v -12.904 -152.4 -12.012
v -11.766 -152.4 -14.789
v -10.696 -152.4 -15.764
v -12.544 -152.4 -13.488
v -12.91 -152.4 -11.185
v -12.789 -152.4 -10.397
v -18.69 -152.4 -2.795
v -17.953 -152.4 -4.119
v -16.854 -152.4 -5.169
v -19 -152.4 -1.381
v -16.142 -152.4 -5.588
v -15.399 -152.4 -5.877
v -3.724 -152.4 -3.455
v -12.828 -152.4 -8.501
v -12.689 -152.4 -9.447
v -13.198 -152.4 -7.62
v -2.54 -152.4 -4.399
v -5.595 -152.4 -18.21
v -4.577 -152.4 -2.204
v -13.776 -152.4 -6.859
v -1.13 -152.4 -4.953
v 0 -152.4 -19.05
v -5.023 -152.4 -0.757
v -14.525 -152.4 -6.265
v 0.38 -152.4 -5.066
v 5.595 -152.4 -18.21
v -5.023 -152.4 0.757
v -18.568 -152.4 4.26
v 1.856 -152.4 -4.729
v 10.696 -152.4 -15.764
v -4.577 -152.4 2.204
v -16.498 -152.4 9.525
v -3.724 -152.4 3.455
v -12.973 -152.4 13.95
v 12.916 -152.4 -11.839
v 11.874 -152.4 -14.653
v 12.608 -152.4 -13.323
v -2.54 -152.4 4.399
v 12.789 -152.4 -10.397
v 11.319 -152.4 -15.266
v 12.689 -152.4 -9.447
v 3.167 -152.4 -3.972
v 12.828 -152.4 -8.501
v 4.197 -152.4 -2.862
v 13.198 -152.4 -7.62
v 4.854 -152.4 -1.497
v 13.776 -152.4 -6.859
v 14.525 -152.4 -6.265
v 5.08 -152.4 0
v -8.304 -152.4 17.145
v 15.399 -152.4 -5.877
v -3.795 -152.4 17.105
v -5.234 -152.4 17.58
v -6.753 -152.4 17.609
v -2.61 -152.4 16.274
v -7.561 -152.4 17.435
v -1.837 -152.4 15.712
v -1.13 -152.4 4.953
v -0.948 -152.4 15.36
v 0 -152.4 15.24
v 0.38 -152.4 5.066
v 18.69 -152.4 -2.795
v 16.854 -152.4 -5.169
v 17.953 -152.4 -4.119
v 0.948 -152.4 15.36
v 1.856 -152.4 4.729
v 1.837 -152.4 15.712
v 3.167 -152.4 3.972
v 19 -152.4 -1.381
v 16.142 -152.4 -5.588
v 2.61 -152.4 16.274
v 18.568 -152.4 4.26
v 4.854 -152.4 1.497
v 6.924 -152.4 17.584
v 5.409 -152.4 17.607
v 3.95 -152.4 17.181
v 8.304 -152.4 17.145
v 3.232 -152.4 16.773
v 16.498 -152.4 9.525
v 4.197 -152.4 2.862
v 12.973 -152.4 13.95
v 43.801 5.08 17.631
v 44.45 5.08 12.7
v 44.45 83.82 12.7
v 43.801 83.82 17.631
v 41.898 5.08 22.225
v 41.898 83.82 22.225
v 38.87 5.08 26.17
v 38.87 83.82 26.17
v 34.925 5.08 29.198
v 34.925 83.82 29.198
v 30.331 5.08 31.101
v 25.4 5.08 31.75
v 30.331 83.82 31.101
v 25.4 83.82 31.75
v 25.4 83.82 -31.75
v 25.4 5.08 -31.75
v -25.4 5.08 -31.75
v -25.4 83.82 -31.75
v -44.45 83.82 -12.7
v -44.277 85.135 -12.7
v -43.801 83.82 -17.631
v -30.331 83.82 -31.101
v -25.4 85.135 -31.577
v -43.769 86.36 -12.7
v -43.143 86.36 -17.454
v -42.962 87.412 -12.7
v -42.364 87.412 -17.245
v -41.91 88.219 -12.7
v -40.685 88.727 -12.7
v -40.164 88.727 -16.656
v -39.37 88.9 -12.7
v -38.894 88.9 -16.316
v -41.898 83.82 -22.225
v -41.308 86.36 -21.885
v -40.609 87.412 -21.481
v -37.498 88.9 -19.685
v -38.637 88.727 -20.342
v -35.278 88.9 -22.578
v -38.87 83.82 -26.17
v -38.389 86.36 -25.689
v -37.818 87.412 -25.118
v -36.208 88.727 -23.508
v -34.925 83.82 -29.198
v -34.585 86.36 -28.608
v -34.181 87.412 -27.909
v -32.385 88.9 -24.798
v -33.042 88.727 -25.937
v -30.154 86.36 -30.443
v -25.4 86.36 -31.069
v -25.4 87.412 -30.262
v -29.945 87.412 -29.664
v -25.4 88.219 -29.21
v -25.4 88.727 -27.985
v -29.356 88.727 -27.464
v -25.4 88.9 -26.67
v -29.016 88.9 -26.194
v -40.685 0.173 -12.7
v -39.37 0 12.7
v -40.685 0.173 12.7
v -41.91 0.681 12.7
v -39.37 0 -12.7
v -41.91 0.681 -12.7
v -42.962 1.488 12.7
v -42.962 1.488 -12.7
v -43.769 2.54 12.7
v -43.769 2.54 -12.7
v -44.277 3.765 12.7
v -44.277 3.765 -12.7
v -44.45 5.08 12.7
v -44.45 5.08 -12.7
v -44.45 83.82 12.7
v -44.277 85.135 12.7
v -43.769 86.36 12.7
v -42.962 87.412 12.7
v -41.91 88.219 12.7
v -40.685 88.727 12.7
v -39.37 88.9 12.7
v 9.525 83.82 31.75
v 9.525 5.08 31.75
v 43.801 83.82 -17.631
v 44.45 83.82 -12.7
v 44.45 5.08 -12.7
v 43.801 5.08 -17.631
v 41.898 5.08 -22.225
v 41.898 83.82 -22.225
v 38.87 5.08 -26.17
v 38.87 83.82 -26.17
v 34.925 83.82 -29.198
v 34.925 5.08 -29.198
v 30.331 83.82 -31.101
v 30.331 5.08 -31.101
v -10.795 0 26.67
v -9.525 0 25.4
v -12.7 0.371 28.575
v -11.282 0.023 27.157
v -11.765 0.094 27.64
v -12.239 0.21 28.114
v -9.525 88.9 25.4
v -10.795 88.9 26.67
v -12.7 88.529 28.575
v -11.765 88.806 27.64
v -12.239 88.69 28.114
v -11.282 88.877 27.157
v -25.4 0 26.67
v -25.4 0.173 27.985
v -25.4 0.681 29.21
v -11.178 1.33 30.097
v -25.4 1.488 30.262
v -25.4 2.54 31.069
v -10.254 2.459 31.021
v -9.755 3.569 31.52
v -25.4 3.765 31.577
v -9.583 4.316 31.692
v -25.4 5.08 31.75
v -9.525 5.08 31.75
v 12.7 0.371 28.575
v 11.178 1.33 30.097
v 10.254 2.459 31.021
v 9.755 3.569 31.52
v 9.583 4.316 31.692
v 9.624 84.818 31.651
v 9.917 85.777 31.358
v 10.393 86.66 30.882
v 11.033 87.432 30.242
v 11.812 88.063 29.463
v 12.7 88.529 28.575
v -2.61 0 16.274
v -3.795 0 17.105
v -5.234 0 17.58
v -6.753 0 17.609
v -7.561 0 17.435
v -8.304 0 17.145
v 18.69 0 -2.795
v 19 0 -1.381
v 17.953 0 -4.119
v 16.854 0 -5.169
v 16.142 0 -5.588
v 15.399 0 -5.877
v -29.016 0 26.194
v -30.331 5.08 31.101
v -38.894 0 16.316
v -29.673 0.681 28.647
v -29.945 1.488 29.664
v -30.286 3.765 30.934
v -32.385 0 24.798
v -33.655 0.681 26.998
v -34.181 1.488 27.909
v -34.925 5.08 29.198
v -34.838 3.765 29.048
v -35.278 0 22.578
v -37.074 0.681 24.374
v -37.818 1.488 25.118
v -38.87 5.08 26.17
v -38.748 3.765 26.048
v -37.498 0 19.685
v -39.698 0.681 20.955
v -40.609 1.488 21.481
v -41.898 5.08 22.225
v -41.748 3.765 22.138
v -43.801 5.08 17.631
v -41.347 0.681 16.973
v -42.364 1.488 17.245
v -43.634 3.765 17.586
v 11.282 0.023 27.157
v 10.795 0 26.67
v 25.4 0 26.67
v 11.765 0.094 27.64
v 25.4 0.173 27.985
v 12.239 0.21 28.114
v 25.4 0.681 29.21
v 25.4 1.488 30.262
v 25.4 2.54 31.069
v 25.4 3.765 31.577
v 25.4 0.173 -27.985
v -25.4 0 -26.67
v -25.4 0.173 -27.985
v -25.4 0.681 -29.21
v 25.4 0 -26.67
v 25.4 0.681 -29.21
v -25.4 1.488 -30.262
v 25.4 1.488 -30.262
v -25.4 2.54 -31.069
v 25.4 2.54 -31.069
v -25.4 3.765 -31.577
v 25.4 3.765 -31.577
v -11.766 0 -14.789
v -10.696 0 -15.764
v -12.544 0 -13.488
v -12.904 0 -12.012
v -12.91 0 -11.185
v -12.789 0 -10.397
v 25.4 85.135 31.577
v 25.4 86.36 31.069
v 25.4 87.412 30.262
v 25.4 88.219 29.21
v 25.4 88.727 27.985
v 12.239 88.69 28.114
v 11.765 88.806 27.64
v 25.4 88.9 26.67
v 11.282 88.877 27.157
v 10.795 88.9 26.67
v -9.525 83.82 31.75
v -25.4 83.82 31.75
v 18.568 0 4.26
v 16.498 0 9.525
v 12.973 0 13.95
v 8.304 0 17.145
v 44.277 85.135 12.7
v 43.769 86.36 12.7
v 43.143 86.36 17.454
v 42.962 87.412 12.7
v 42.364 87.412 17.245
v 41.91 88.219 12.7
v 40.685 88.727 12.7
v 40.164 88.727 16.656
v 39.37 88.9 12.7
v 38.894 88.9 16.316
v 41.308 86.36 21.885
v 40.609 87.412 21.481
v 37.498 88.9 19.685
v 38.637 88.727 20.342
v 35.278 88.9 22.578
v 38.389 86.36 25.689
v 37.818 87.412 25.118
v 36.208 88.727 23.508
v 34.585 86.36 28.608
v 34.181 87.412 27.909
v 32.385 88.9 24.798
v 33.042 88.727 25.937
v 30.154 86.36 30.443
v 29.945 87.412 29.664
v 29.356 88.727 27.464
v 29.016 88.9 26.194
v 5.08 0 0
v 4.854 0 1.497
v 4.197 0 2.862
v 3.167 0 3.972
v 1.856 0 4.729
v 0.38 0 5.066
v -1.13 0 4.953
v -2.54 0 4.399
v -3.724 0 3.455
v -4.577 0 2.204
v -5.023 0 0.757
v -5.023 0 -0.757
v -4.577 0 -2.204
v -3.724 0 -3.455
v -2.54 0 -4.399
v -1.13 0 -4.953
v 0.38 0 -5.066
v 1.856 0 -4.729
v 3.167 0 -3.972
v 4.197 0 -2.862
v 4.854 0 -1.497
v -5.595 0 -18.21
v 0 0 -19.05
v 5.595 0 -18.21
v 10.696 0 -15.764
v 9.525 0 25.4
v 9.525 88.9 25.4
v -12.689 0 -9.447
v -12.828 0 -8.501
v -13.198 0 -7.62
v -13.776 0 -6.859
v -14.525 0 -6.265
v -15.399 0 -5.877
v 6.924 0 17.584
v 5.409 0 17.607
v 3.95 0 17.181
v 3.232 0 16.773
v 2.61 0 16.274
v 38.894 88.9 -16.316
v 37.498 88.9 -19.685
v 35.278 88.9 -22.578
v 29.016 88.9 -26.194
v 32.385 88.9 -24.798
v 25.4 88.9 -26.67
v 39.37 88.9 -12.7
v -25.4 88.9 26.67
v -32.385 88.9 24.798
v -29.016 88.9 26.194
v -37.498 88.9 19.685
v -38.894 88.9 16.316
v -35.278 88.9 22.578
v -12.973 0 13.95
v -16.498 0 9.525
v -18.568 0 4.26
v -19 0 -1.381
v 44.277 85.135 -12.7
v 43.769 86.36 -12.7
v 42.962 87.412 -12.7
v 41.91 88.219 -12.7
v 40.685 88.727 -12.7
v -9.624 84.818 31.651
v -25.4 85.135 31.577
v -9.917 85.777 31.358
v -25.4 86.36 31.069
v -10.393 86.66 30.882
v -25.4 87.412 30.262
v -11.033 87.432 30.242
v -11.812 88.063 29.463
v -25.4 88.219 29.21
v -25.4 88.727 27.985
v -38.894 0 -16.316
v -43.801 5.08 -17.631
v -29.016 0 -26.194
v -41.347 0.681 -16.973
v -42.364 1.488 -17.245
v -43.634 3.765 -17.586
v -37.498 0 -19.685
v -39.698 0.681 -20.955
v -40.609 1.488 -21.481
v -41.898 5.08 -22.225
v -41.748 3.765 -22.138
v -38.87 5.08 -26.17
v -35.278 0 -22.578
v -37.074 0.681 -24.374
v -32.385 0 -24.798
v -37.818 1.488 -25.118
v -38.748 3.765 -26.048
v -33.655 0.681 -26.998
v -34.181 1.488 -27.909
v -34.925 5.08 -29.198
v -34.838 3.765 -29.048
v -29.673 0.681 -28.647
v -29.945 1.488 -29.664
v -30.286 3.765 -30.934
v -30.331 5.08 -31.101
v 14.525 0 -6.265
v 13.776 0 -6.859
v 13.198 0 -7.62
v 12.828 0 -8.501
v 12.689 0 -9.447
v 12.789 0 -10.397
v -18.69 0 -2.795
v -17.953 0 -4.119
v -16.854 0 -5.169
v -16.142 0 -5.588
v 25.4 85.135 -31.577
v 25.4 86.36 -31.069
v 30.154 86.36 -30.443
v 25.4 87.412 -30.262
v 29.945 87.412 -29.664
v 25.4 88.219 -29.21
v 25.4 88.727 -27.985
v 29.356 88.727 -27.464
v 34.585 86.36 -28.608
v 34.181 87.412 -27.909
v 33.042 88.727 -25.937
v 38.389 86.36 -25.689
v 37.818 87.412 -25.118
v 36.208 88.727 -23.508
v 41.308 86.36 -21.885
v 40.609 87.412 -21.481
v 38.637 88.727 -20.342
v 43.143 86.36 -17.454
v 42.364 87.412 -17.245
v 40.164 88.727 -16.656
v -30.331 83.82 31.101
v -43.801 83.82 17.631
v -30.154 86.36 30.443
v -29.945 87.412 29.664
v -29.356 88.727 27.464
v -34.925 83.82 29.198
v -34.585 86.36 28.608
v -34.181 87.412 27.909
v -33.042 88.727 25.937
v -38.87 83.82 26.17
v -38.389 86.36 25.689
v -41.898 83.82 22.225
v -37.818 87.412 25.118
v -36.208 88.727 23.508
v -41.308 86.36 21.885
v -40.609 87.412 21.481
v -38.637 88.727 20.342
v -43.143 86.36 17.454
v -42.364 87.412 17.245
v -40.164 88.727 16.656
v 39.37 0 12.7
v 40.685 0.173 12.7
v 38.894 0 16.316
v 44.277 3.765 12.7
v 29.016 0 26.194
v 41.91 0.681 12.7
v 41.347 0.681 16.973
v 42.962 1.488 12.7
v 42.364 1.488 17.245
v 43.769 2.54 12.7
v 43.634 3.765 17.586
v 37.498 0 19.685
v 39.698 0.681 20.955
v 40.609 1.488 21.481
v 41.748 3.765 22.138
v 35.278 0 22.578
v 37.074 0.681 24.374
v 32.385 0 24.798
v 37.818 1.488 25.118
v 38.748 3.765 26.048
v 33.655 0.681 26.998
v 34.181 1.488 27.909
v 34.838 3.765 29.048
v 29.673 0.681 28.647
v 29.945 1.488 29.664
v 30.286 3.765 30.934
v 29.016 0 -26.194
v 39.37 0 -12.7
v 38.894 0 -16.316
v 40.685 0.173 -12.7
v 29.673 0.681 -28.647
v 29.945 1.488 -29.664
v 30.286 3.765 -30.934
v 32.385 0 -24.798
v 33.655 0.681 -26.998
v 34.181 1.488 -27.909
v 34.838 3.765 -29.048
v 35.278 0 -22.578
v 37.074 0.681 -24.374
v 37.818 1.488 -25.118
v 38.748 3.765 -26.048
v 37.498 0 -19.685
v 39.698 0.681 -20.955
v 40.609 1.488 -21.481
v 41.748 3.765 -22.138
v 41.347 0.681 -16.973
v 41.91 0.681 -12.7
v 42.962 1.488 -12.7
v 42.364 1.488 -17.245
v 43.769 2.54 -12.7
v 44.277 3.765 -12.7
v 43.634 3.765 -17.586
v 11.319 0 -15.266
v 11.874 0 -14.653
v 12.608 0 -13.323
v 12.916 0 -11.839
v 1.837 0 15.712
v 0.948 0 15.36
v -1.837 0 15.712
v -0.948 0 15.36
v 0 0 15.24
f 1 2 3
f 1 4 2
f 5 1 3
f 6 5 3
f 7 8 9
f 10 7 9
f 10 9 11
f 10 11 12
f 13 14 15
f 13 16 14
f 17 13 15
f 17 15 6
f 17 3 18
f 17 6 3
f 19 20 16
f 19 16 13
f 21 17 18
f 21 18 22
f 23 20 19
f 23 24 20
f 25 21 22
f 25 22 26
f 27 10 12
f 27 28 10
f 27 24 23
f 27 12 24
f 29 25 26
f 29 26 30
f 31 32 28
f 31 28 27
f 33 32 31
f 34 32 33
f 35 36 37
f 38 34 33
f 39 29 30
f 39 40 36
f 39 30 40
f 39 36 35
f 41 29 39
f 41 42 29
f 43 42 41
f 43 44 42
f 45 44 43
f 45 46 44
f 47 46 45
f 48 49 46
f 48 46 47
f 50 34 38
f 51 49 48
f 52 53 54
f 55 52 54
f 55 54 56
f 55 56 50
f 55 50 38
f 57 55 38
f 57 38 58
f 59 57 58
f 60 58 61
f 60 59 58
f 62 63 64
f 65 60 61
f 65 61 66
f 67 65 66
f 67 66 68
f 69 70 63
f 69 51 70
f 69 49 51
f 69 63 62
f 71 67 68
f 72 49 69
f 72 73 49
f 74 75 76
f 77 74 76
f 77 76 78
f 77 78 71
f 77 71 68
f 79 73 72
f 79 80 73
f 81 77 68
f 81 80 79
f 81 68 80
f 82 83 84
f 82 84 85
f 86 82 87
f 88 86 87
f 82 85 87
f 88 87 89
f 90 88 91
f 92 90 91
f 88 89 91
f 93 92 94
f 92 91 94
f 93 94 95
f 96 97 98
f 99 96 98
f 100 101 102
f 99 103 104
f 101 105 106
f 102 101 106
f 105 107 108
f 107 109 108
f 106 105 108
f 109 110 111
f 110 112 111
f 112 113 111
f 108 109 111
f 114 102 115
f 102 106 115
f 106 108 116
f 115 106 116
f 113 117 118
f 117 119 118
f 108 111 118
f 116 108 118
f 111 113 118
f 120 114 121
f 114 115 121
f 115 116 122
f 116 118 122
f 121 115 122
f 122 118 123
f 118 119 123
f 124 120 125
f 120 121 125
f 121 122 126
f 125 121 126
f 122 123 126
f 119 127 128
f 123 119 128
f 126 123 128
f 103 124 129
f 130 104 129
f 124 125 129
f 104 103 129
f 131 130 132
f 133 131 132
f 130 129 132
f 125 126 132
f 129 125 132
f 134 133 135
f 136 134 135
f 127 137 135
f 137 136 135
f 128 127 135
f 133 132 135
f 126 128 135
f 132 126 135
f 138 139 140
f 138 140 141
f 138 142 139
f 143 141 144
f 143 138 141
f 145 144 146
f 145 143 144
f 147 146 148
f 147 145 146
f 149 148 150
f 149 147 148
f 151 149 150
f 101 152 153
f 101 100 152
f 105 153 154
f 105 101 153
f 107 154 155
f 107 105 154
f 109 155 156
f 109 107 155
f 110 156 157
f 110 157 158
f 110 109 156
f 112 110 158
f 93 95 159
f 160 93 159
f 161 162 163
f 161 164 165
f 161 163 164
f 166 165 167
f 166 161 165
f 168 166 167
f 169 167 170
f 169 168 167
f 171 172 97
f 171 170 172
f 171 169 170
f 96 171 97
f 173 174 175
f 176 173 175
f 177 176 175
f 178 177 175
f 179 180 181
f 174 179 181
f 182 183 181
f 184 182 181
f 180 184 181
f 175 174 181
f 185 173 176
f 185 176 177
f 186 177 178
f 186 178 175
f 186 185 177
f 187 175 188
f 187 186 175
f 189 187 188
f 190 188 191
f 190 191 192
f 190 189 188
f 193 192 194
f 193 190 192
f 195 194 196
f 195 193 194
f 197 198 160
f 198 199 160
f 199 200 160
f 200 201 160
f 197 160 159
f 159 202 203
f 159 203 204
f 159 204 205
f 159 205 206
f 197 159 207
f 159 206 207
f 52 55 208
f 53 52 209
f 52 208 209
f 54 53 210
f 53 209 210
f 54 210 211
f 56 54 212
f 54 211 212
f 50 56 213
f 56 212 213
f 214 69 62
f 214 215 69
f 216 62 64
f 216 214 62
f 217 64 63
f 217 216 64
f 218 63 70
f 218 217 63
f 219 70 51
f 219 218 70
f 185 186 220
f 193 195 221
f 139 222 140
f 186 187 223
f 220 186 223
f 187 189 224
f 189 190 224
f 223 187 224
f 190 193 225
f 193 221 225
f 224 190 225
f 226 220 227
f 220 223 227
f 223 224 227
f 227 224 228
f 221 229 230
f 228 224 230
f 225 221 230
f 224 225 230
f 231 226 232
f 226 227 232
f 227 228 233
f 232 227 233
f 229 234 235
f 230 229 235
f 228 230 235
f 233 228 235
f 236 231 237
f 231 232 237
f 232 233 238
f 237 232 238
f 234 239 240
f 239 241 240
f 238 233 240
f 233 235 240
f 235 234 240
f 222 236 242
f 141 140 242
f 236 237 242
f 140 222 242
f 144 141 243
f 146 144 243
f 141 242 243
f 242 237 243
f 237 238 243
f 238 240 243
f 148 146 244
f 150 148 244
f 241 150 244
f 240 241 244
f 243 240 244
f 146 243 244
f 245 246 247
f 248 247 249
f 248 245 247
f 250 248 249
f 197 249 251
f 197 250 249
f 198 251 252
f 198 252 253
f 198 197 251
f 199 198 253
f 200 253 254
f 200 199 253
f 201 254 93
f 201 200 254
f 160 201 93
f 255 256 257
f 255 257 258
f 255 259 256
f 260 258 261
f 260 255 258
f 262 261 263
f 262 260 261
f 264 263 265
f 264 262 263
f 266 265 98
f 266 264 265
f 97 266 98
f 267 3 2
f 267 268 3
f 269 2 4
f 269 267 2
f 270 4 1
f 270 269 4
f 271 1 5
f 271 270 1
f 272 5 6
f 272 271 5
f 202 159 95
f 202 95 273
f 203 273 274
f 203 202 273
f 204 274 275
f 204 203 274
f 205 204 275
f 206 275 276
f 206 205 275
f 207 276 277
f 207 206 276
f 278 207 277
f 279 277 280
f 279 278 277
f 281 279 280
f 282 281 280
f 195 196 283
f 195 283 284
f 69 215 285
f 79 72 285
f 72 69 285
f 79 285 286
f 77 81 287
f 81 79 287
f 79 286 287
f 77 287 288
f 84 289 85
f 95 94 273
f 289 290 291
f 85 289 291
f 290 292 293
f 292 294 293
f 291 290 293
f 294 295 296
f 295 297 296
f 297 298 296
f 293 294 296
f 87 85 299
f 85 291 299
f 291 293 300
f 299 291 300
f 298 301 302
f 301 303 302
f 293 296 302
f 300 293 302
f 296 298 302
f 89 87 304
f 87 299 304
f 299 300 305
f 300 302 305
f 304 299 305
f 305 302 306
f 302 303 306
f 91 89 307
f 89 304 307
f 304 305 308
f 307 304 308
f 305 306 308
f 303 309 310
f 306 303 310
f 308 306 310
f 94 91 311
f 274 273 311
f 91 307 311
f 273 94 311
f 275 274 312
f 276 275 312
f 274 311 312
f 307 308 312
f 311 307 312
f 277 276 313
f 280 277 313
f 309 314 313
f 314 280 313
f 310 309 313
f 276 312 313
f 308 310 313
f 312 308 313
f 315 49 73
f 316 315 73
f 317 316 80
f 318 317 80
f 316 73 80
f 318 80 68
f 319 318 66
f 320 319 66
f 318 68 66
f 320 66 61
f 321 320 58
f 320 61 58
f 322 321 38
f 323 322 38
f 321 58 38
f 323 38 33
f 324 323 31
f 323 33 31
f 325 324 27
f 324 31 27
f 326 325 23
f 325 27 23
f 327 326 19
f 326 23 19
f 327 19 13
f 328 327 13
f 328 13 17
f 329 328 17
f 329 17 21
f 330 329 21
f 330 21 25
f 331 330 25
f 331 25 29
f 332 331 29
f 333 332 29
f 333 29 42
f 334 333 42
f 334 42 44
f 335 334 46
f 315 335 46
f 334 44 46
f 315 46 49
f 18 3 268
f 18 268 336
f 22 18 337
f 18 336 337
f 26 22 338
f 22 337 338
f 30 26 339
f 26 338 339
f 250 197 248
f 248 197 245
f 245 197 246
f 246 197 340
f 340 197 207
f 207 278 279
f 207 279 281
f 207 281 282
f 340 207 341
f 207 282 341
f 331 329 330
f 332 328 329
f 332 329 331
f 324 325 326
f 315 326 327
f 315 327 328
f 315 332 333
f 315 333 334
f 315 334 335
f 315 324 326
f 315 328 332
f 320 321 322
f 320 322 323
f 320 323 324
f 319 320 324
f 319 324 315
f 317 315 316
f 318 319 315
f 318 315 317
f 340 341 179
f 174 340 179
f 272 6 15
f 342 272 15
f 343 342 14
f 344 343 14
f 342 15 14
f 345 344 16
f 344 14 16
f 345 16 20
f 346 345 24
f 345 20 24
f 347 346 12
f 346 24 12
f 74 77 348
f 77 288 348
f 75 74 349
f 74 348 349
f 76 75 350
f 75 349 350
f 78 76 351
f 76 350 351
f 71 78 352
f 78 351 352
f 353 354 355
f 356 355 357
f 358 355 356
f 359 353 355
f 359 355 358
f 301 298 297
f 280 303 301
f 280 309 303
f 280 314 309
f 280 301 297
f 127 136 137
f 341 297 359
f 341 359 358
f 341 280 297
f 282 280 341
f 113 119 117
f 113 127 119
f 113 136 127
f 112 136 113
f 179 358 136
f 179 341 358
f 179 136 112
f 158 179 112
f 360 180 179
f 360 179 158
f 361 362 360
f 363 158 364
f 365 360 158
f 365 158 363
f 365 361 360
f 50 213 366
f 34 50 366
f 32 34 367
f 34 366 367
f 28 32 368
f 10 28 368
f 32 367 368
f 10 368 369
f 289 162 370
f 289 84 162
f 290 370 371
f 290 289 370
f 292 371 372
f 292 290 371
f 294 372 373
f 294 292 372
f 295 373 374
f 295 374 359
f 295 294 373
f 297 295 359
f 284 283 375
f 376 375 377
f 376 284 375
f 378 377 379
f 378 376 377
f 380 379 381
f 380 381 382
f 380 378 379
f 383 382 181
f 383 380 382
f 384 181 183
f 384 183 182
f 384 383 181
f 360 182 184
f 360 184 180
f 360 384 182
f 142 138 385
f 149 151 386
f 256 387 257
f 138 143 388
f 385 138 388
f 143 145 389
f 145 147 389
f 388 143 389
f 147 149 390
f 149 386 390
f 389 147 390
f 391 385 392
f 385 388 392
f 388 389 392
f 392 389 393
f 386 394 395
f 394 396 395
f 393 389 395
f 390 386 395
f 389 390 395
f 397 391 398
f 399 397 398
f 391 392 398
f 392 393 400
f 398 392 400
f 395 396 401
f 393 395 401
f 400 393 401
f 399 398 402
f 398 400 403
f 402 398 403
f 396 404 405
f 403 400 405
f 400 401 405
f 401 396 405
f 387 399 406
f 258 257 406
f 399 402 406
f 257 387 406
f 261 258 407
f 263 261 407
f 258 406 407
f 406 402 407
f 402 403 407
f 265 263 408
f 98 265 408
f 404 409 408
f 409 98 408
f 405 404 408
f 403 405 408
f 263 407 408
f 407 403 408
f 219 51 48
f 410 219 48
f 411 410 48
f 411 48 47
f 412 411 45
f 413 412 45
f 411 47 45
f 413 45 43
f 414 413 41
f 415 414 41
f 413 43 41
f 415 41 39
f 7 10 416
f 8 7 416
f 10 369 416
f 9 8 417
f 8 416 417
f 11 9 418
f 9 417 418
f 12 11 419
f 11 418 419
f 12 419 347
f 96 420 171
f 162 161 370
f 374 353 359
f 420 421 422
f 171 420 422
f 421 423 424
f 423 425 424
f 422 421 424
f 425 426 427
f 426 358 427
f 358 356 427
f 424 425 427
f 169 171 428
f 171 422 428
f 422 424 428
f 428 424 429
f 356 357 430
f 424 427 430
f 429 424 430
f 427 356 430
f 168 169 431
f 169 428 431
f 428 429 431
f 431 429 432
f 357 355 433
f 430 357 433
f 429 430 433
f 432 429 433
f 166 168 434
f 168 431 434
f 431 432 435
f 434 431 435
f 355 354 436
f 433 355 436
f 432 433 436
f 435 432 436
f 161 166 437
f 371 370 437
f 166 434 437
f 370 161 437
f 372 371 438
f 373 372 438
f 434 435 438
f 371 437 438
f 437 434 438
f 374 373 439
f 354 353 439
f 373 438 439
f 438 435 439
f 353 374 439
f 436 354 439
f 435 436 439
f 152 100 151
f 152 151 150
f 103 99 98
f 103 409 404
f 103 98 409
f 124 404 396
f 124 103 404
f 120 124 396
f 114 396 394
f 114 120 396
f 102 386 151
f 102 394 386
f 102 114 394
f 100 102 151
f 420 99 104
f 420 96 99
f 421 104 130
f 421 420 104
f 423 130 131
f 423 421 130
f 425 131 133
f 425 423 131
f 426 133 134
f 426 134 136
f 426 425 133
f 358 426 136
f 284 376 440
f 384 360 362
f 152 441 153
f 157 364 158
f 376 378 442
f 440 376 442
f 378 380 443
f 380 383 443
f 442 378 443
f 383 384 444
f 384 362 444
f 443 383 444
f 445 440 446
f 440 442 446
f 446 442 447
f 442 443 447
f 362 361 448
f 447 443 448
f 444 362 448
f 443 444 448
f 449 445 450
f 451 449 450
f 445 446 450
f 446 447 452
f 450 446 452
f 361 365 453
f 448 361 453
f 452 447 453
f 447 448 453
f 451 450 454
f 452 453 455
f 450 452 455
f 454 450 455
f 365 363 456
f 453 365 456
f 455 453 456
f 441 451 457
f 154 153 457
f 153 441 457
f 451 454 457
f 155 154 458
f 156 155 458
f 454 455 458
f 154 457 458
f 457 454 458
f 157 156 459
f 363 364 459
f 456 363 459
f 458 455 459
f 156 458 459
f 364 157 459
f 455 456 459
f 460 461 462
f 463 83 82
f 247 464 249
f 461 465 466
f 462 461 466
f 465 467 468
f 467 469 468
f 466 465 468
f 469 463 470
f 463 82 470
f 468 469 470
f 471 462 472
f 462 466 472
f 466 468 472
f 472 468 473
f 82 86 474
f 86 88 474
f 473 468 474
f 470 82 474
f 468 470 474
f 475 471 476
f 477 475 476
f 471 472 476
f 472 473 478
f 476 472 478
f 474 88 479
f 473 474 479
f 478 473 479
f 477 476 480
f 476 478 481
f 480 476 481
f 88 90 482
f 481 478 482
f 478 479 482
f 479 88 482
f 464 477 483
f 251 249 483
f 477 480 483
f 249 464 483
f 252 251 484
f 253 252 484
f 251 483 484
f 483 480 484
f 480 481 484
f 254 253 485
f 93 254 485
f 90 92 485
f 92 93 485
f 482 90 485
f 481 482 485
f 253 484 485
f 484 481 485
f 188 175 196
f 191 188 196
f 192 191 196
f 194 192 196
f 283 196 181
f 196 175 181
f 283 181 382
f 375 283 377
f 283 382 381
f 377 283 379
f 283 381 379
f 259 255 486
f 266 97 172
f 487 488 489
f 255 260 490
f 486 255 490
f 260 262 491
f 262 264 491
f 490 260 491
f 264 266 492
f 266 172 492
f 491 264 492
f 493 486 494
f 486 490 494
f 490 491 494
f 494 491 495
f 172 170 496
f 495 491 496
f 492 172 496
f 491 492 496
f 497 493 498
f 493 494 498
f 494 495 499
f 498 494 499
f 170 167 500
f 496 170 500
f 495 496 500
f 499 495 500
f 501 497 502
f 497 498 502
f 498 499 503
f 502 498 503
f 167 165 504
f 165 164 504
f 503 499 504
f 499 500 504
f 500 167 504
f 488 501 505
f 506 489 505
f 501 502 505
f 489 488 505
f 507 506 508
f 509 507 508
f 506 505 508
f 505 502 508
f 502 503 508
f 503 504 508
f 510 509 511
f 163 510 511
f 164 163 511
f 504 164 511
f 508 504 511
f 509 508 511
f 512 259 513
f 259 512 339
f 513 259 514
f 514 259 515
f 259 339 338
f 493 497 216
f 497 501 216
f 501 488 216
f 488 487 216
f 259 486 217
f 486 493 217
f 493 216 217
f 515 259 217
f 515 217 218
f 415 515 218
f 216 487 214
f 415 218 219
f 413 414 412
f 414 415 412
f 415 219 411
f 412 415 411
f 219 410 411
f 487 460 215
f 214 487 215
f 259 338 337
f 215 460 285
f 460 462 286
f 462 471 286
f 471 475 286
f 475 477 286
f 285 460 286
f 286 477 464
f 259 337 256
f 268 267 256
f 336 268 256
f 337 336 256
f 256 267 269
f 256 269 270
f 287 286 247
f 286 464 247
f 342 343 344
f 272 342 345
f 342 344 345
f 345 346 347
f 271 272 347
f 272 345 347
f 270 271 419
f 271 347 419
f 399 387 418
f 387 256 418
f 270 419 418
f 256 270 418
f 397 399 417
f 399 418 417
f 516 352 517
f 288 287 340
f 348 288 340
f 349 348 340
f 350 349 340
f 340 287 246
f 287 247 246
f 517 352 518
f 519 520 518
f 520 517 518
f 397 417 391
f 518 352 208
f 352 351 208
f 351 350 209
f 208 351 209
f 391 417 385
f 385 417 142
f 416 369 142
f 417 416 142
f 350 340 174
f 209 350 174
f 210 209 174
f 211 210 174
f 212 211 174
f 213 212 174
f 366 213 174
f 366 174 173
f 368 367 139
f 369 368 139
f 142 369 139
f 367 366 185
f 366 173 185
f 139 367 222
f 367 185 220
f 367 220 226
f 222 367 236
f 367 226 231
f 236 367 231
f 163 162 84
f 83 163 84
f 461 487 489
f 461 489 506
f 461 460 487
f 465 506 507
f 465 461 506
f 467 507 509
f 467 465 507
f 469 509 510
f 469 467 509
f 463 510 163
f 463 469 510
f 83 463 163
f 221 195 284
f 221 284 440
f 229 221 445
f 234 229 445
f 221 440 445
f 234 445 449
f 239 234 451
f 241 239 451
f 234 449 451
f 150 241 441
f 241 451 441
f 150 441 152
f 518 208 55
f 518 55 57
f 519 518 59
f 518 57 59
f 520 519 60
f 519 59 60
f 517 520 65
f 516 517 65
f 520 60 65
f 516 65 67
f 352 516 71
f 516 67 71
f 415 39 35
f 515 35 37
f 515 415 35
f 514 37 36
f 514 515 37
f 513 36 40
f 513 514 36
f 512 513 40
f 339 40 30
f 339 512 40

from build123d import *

# Parameters (mm, degrees)
F0_R     = 19.05
F1_DEPTH = 152.4
F2_W     = 88.9
F2_H     = 63.5
F3_DEPTH = 88.9
F4_R     = 19.05
F5_R     = 5.08
F6_DEPTH = 152.4
F8_DEPTH = 241.301
F9_R     = 5.08
F10_R    = 5.08


with BuildPart() as f1:
    # F0 (on Front) → F1 (new body)
    with BuildSketch(Plane.XZ):
        Circle(F0_R)
    extrude(amount=F1_DEPTH)

    # F2 (on face) → F3 (join)
    with BuildSketch(Plane(origin=(0, 0, 0), x_dir=(-1, 0, 0), z_dir=(0, 1, 0))):
        Rectangle(F2_W, F2_H)
    extrude(amount=F3_DEPTH)

    # F4
    f4_edges = [f1.edges().sort_by_distance(p)[0] for p in [
        (44.45, 44.45, 31.75),
        (-44.45, 44.45, 31.75),
        (-44.45, 44.45, -31.75),
        (44.45, 44.45, -31.75),
    ]]
    fillet(f4_edges, radius=F4_R)

    # F5 (on face) → F6 (cut, through all)
    with BuildSketch(Plane.XZ.offset(152.4)):
        Circle(F5_R)
        with BuildLine():
            ThreePointArc((3.7909021354, 18.669), (0, 19.05), (-3.7909021354, 18.669))
            ThreePointArc((-3.7909021354, 18.669), (0, 15.24), (3.7909021354, 18.669))
        make_face()
        with BuildLine():
            ThreePointArc((-18.0632793309, -6.0514824475), (-16.4977839421, -9.525), (-14.2723771956, -12.6175175525))
            ThreePointArc((-14.2723771956, -12.6175175525), (-13.1982271537, -7.62), (-18.0632793309, -6.0514824475))
        make_face()
        with BuildLine():
            ThreePointArc((14.2723771956, -12.6175175525), (16.4977839421, -9.525), (18.0632793309, -6.0514824475))
            ThreePointArc((18.0632793309, -6.0514824475), (13.1982271537, -7.62), (14.2723771956, -12.6175175525))
        make_face()
    extrude(amount=-F6_DEPTH, mode=Mode.SUBTRACT)

    # F7 (on face) → F8 (cut, through all)
    with BuildSketch(Plane(origin=(0, 88.9, 0), x_dir=(-1, 0, 0), z_dir=(0, 1, 0))):
        Polygon((9.525, 31.75), (0, 31.75), (-9.525, 31.75), (-12.7, 28.575), (-9.525, 25.4), (0, 25.4), (9.525, 25.4), (12.7, 28.575), align=None)
    extrude(amount=-F8_DEPTH, mode=Mode.SUBTRACT)

    # F9
    f9_edges = [f1.edges().sort_by_distance(p)[0] for p in [
        (3.790902, -76.2, 18.669),
        (-3.790902, -76.2, 18.669),
        (-14.272377, -76.2, -12.617518),
        (-18.063279, -76.2, -6.051482),
        (18.063279, -76.2, -6.051482),
        (14.272377, -76.2, -12.617518),
    ]]
    fillet(f9_edges, radius=F9_R)

    # F10
    f10_edges = [f1.edges().sort_by_distance(p)[0] for p in [
        (44.45, 0, 0),
        (44.45, 88.9, 0),
    ]]
    fillet(f10_edges, radius=F10_R)


solid = f1.part
